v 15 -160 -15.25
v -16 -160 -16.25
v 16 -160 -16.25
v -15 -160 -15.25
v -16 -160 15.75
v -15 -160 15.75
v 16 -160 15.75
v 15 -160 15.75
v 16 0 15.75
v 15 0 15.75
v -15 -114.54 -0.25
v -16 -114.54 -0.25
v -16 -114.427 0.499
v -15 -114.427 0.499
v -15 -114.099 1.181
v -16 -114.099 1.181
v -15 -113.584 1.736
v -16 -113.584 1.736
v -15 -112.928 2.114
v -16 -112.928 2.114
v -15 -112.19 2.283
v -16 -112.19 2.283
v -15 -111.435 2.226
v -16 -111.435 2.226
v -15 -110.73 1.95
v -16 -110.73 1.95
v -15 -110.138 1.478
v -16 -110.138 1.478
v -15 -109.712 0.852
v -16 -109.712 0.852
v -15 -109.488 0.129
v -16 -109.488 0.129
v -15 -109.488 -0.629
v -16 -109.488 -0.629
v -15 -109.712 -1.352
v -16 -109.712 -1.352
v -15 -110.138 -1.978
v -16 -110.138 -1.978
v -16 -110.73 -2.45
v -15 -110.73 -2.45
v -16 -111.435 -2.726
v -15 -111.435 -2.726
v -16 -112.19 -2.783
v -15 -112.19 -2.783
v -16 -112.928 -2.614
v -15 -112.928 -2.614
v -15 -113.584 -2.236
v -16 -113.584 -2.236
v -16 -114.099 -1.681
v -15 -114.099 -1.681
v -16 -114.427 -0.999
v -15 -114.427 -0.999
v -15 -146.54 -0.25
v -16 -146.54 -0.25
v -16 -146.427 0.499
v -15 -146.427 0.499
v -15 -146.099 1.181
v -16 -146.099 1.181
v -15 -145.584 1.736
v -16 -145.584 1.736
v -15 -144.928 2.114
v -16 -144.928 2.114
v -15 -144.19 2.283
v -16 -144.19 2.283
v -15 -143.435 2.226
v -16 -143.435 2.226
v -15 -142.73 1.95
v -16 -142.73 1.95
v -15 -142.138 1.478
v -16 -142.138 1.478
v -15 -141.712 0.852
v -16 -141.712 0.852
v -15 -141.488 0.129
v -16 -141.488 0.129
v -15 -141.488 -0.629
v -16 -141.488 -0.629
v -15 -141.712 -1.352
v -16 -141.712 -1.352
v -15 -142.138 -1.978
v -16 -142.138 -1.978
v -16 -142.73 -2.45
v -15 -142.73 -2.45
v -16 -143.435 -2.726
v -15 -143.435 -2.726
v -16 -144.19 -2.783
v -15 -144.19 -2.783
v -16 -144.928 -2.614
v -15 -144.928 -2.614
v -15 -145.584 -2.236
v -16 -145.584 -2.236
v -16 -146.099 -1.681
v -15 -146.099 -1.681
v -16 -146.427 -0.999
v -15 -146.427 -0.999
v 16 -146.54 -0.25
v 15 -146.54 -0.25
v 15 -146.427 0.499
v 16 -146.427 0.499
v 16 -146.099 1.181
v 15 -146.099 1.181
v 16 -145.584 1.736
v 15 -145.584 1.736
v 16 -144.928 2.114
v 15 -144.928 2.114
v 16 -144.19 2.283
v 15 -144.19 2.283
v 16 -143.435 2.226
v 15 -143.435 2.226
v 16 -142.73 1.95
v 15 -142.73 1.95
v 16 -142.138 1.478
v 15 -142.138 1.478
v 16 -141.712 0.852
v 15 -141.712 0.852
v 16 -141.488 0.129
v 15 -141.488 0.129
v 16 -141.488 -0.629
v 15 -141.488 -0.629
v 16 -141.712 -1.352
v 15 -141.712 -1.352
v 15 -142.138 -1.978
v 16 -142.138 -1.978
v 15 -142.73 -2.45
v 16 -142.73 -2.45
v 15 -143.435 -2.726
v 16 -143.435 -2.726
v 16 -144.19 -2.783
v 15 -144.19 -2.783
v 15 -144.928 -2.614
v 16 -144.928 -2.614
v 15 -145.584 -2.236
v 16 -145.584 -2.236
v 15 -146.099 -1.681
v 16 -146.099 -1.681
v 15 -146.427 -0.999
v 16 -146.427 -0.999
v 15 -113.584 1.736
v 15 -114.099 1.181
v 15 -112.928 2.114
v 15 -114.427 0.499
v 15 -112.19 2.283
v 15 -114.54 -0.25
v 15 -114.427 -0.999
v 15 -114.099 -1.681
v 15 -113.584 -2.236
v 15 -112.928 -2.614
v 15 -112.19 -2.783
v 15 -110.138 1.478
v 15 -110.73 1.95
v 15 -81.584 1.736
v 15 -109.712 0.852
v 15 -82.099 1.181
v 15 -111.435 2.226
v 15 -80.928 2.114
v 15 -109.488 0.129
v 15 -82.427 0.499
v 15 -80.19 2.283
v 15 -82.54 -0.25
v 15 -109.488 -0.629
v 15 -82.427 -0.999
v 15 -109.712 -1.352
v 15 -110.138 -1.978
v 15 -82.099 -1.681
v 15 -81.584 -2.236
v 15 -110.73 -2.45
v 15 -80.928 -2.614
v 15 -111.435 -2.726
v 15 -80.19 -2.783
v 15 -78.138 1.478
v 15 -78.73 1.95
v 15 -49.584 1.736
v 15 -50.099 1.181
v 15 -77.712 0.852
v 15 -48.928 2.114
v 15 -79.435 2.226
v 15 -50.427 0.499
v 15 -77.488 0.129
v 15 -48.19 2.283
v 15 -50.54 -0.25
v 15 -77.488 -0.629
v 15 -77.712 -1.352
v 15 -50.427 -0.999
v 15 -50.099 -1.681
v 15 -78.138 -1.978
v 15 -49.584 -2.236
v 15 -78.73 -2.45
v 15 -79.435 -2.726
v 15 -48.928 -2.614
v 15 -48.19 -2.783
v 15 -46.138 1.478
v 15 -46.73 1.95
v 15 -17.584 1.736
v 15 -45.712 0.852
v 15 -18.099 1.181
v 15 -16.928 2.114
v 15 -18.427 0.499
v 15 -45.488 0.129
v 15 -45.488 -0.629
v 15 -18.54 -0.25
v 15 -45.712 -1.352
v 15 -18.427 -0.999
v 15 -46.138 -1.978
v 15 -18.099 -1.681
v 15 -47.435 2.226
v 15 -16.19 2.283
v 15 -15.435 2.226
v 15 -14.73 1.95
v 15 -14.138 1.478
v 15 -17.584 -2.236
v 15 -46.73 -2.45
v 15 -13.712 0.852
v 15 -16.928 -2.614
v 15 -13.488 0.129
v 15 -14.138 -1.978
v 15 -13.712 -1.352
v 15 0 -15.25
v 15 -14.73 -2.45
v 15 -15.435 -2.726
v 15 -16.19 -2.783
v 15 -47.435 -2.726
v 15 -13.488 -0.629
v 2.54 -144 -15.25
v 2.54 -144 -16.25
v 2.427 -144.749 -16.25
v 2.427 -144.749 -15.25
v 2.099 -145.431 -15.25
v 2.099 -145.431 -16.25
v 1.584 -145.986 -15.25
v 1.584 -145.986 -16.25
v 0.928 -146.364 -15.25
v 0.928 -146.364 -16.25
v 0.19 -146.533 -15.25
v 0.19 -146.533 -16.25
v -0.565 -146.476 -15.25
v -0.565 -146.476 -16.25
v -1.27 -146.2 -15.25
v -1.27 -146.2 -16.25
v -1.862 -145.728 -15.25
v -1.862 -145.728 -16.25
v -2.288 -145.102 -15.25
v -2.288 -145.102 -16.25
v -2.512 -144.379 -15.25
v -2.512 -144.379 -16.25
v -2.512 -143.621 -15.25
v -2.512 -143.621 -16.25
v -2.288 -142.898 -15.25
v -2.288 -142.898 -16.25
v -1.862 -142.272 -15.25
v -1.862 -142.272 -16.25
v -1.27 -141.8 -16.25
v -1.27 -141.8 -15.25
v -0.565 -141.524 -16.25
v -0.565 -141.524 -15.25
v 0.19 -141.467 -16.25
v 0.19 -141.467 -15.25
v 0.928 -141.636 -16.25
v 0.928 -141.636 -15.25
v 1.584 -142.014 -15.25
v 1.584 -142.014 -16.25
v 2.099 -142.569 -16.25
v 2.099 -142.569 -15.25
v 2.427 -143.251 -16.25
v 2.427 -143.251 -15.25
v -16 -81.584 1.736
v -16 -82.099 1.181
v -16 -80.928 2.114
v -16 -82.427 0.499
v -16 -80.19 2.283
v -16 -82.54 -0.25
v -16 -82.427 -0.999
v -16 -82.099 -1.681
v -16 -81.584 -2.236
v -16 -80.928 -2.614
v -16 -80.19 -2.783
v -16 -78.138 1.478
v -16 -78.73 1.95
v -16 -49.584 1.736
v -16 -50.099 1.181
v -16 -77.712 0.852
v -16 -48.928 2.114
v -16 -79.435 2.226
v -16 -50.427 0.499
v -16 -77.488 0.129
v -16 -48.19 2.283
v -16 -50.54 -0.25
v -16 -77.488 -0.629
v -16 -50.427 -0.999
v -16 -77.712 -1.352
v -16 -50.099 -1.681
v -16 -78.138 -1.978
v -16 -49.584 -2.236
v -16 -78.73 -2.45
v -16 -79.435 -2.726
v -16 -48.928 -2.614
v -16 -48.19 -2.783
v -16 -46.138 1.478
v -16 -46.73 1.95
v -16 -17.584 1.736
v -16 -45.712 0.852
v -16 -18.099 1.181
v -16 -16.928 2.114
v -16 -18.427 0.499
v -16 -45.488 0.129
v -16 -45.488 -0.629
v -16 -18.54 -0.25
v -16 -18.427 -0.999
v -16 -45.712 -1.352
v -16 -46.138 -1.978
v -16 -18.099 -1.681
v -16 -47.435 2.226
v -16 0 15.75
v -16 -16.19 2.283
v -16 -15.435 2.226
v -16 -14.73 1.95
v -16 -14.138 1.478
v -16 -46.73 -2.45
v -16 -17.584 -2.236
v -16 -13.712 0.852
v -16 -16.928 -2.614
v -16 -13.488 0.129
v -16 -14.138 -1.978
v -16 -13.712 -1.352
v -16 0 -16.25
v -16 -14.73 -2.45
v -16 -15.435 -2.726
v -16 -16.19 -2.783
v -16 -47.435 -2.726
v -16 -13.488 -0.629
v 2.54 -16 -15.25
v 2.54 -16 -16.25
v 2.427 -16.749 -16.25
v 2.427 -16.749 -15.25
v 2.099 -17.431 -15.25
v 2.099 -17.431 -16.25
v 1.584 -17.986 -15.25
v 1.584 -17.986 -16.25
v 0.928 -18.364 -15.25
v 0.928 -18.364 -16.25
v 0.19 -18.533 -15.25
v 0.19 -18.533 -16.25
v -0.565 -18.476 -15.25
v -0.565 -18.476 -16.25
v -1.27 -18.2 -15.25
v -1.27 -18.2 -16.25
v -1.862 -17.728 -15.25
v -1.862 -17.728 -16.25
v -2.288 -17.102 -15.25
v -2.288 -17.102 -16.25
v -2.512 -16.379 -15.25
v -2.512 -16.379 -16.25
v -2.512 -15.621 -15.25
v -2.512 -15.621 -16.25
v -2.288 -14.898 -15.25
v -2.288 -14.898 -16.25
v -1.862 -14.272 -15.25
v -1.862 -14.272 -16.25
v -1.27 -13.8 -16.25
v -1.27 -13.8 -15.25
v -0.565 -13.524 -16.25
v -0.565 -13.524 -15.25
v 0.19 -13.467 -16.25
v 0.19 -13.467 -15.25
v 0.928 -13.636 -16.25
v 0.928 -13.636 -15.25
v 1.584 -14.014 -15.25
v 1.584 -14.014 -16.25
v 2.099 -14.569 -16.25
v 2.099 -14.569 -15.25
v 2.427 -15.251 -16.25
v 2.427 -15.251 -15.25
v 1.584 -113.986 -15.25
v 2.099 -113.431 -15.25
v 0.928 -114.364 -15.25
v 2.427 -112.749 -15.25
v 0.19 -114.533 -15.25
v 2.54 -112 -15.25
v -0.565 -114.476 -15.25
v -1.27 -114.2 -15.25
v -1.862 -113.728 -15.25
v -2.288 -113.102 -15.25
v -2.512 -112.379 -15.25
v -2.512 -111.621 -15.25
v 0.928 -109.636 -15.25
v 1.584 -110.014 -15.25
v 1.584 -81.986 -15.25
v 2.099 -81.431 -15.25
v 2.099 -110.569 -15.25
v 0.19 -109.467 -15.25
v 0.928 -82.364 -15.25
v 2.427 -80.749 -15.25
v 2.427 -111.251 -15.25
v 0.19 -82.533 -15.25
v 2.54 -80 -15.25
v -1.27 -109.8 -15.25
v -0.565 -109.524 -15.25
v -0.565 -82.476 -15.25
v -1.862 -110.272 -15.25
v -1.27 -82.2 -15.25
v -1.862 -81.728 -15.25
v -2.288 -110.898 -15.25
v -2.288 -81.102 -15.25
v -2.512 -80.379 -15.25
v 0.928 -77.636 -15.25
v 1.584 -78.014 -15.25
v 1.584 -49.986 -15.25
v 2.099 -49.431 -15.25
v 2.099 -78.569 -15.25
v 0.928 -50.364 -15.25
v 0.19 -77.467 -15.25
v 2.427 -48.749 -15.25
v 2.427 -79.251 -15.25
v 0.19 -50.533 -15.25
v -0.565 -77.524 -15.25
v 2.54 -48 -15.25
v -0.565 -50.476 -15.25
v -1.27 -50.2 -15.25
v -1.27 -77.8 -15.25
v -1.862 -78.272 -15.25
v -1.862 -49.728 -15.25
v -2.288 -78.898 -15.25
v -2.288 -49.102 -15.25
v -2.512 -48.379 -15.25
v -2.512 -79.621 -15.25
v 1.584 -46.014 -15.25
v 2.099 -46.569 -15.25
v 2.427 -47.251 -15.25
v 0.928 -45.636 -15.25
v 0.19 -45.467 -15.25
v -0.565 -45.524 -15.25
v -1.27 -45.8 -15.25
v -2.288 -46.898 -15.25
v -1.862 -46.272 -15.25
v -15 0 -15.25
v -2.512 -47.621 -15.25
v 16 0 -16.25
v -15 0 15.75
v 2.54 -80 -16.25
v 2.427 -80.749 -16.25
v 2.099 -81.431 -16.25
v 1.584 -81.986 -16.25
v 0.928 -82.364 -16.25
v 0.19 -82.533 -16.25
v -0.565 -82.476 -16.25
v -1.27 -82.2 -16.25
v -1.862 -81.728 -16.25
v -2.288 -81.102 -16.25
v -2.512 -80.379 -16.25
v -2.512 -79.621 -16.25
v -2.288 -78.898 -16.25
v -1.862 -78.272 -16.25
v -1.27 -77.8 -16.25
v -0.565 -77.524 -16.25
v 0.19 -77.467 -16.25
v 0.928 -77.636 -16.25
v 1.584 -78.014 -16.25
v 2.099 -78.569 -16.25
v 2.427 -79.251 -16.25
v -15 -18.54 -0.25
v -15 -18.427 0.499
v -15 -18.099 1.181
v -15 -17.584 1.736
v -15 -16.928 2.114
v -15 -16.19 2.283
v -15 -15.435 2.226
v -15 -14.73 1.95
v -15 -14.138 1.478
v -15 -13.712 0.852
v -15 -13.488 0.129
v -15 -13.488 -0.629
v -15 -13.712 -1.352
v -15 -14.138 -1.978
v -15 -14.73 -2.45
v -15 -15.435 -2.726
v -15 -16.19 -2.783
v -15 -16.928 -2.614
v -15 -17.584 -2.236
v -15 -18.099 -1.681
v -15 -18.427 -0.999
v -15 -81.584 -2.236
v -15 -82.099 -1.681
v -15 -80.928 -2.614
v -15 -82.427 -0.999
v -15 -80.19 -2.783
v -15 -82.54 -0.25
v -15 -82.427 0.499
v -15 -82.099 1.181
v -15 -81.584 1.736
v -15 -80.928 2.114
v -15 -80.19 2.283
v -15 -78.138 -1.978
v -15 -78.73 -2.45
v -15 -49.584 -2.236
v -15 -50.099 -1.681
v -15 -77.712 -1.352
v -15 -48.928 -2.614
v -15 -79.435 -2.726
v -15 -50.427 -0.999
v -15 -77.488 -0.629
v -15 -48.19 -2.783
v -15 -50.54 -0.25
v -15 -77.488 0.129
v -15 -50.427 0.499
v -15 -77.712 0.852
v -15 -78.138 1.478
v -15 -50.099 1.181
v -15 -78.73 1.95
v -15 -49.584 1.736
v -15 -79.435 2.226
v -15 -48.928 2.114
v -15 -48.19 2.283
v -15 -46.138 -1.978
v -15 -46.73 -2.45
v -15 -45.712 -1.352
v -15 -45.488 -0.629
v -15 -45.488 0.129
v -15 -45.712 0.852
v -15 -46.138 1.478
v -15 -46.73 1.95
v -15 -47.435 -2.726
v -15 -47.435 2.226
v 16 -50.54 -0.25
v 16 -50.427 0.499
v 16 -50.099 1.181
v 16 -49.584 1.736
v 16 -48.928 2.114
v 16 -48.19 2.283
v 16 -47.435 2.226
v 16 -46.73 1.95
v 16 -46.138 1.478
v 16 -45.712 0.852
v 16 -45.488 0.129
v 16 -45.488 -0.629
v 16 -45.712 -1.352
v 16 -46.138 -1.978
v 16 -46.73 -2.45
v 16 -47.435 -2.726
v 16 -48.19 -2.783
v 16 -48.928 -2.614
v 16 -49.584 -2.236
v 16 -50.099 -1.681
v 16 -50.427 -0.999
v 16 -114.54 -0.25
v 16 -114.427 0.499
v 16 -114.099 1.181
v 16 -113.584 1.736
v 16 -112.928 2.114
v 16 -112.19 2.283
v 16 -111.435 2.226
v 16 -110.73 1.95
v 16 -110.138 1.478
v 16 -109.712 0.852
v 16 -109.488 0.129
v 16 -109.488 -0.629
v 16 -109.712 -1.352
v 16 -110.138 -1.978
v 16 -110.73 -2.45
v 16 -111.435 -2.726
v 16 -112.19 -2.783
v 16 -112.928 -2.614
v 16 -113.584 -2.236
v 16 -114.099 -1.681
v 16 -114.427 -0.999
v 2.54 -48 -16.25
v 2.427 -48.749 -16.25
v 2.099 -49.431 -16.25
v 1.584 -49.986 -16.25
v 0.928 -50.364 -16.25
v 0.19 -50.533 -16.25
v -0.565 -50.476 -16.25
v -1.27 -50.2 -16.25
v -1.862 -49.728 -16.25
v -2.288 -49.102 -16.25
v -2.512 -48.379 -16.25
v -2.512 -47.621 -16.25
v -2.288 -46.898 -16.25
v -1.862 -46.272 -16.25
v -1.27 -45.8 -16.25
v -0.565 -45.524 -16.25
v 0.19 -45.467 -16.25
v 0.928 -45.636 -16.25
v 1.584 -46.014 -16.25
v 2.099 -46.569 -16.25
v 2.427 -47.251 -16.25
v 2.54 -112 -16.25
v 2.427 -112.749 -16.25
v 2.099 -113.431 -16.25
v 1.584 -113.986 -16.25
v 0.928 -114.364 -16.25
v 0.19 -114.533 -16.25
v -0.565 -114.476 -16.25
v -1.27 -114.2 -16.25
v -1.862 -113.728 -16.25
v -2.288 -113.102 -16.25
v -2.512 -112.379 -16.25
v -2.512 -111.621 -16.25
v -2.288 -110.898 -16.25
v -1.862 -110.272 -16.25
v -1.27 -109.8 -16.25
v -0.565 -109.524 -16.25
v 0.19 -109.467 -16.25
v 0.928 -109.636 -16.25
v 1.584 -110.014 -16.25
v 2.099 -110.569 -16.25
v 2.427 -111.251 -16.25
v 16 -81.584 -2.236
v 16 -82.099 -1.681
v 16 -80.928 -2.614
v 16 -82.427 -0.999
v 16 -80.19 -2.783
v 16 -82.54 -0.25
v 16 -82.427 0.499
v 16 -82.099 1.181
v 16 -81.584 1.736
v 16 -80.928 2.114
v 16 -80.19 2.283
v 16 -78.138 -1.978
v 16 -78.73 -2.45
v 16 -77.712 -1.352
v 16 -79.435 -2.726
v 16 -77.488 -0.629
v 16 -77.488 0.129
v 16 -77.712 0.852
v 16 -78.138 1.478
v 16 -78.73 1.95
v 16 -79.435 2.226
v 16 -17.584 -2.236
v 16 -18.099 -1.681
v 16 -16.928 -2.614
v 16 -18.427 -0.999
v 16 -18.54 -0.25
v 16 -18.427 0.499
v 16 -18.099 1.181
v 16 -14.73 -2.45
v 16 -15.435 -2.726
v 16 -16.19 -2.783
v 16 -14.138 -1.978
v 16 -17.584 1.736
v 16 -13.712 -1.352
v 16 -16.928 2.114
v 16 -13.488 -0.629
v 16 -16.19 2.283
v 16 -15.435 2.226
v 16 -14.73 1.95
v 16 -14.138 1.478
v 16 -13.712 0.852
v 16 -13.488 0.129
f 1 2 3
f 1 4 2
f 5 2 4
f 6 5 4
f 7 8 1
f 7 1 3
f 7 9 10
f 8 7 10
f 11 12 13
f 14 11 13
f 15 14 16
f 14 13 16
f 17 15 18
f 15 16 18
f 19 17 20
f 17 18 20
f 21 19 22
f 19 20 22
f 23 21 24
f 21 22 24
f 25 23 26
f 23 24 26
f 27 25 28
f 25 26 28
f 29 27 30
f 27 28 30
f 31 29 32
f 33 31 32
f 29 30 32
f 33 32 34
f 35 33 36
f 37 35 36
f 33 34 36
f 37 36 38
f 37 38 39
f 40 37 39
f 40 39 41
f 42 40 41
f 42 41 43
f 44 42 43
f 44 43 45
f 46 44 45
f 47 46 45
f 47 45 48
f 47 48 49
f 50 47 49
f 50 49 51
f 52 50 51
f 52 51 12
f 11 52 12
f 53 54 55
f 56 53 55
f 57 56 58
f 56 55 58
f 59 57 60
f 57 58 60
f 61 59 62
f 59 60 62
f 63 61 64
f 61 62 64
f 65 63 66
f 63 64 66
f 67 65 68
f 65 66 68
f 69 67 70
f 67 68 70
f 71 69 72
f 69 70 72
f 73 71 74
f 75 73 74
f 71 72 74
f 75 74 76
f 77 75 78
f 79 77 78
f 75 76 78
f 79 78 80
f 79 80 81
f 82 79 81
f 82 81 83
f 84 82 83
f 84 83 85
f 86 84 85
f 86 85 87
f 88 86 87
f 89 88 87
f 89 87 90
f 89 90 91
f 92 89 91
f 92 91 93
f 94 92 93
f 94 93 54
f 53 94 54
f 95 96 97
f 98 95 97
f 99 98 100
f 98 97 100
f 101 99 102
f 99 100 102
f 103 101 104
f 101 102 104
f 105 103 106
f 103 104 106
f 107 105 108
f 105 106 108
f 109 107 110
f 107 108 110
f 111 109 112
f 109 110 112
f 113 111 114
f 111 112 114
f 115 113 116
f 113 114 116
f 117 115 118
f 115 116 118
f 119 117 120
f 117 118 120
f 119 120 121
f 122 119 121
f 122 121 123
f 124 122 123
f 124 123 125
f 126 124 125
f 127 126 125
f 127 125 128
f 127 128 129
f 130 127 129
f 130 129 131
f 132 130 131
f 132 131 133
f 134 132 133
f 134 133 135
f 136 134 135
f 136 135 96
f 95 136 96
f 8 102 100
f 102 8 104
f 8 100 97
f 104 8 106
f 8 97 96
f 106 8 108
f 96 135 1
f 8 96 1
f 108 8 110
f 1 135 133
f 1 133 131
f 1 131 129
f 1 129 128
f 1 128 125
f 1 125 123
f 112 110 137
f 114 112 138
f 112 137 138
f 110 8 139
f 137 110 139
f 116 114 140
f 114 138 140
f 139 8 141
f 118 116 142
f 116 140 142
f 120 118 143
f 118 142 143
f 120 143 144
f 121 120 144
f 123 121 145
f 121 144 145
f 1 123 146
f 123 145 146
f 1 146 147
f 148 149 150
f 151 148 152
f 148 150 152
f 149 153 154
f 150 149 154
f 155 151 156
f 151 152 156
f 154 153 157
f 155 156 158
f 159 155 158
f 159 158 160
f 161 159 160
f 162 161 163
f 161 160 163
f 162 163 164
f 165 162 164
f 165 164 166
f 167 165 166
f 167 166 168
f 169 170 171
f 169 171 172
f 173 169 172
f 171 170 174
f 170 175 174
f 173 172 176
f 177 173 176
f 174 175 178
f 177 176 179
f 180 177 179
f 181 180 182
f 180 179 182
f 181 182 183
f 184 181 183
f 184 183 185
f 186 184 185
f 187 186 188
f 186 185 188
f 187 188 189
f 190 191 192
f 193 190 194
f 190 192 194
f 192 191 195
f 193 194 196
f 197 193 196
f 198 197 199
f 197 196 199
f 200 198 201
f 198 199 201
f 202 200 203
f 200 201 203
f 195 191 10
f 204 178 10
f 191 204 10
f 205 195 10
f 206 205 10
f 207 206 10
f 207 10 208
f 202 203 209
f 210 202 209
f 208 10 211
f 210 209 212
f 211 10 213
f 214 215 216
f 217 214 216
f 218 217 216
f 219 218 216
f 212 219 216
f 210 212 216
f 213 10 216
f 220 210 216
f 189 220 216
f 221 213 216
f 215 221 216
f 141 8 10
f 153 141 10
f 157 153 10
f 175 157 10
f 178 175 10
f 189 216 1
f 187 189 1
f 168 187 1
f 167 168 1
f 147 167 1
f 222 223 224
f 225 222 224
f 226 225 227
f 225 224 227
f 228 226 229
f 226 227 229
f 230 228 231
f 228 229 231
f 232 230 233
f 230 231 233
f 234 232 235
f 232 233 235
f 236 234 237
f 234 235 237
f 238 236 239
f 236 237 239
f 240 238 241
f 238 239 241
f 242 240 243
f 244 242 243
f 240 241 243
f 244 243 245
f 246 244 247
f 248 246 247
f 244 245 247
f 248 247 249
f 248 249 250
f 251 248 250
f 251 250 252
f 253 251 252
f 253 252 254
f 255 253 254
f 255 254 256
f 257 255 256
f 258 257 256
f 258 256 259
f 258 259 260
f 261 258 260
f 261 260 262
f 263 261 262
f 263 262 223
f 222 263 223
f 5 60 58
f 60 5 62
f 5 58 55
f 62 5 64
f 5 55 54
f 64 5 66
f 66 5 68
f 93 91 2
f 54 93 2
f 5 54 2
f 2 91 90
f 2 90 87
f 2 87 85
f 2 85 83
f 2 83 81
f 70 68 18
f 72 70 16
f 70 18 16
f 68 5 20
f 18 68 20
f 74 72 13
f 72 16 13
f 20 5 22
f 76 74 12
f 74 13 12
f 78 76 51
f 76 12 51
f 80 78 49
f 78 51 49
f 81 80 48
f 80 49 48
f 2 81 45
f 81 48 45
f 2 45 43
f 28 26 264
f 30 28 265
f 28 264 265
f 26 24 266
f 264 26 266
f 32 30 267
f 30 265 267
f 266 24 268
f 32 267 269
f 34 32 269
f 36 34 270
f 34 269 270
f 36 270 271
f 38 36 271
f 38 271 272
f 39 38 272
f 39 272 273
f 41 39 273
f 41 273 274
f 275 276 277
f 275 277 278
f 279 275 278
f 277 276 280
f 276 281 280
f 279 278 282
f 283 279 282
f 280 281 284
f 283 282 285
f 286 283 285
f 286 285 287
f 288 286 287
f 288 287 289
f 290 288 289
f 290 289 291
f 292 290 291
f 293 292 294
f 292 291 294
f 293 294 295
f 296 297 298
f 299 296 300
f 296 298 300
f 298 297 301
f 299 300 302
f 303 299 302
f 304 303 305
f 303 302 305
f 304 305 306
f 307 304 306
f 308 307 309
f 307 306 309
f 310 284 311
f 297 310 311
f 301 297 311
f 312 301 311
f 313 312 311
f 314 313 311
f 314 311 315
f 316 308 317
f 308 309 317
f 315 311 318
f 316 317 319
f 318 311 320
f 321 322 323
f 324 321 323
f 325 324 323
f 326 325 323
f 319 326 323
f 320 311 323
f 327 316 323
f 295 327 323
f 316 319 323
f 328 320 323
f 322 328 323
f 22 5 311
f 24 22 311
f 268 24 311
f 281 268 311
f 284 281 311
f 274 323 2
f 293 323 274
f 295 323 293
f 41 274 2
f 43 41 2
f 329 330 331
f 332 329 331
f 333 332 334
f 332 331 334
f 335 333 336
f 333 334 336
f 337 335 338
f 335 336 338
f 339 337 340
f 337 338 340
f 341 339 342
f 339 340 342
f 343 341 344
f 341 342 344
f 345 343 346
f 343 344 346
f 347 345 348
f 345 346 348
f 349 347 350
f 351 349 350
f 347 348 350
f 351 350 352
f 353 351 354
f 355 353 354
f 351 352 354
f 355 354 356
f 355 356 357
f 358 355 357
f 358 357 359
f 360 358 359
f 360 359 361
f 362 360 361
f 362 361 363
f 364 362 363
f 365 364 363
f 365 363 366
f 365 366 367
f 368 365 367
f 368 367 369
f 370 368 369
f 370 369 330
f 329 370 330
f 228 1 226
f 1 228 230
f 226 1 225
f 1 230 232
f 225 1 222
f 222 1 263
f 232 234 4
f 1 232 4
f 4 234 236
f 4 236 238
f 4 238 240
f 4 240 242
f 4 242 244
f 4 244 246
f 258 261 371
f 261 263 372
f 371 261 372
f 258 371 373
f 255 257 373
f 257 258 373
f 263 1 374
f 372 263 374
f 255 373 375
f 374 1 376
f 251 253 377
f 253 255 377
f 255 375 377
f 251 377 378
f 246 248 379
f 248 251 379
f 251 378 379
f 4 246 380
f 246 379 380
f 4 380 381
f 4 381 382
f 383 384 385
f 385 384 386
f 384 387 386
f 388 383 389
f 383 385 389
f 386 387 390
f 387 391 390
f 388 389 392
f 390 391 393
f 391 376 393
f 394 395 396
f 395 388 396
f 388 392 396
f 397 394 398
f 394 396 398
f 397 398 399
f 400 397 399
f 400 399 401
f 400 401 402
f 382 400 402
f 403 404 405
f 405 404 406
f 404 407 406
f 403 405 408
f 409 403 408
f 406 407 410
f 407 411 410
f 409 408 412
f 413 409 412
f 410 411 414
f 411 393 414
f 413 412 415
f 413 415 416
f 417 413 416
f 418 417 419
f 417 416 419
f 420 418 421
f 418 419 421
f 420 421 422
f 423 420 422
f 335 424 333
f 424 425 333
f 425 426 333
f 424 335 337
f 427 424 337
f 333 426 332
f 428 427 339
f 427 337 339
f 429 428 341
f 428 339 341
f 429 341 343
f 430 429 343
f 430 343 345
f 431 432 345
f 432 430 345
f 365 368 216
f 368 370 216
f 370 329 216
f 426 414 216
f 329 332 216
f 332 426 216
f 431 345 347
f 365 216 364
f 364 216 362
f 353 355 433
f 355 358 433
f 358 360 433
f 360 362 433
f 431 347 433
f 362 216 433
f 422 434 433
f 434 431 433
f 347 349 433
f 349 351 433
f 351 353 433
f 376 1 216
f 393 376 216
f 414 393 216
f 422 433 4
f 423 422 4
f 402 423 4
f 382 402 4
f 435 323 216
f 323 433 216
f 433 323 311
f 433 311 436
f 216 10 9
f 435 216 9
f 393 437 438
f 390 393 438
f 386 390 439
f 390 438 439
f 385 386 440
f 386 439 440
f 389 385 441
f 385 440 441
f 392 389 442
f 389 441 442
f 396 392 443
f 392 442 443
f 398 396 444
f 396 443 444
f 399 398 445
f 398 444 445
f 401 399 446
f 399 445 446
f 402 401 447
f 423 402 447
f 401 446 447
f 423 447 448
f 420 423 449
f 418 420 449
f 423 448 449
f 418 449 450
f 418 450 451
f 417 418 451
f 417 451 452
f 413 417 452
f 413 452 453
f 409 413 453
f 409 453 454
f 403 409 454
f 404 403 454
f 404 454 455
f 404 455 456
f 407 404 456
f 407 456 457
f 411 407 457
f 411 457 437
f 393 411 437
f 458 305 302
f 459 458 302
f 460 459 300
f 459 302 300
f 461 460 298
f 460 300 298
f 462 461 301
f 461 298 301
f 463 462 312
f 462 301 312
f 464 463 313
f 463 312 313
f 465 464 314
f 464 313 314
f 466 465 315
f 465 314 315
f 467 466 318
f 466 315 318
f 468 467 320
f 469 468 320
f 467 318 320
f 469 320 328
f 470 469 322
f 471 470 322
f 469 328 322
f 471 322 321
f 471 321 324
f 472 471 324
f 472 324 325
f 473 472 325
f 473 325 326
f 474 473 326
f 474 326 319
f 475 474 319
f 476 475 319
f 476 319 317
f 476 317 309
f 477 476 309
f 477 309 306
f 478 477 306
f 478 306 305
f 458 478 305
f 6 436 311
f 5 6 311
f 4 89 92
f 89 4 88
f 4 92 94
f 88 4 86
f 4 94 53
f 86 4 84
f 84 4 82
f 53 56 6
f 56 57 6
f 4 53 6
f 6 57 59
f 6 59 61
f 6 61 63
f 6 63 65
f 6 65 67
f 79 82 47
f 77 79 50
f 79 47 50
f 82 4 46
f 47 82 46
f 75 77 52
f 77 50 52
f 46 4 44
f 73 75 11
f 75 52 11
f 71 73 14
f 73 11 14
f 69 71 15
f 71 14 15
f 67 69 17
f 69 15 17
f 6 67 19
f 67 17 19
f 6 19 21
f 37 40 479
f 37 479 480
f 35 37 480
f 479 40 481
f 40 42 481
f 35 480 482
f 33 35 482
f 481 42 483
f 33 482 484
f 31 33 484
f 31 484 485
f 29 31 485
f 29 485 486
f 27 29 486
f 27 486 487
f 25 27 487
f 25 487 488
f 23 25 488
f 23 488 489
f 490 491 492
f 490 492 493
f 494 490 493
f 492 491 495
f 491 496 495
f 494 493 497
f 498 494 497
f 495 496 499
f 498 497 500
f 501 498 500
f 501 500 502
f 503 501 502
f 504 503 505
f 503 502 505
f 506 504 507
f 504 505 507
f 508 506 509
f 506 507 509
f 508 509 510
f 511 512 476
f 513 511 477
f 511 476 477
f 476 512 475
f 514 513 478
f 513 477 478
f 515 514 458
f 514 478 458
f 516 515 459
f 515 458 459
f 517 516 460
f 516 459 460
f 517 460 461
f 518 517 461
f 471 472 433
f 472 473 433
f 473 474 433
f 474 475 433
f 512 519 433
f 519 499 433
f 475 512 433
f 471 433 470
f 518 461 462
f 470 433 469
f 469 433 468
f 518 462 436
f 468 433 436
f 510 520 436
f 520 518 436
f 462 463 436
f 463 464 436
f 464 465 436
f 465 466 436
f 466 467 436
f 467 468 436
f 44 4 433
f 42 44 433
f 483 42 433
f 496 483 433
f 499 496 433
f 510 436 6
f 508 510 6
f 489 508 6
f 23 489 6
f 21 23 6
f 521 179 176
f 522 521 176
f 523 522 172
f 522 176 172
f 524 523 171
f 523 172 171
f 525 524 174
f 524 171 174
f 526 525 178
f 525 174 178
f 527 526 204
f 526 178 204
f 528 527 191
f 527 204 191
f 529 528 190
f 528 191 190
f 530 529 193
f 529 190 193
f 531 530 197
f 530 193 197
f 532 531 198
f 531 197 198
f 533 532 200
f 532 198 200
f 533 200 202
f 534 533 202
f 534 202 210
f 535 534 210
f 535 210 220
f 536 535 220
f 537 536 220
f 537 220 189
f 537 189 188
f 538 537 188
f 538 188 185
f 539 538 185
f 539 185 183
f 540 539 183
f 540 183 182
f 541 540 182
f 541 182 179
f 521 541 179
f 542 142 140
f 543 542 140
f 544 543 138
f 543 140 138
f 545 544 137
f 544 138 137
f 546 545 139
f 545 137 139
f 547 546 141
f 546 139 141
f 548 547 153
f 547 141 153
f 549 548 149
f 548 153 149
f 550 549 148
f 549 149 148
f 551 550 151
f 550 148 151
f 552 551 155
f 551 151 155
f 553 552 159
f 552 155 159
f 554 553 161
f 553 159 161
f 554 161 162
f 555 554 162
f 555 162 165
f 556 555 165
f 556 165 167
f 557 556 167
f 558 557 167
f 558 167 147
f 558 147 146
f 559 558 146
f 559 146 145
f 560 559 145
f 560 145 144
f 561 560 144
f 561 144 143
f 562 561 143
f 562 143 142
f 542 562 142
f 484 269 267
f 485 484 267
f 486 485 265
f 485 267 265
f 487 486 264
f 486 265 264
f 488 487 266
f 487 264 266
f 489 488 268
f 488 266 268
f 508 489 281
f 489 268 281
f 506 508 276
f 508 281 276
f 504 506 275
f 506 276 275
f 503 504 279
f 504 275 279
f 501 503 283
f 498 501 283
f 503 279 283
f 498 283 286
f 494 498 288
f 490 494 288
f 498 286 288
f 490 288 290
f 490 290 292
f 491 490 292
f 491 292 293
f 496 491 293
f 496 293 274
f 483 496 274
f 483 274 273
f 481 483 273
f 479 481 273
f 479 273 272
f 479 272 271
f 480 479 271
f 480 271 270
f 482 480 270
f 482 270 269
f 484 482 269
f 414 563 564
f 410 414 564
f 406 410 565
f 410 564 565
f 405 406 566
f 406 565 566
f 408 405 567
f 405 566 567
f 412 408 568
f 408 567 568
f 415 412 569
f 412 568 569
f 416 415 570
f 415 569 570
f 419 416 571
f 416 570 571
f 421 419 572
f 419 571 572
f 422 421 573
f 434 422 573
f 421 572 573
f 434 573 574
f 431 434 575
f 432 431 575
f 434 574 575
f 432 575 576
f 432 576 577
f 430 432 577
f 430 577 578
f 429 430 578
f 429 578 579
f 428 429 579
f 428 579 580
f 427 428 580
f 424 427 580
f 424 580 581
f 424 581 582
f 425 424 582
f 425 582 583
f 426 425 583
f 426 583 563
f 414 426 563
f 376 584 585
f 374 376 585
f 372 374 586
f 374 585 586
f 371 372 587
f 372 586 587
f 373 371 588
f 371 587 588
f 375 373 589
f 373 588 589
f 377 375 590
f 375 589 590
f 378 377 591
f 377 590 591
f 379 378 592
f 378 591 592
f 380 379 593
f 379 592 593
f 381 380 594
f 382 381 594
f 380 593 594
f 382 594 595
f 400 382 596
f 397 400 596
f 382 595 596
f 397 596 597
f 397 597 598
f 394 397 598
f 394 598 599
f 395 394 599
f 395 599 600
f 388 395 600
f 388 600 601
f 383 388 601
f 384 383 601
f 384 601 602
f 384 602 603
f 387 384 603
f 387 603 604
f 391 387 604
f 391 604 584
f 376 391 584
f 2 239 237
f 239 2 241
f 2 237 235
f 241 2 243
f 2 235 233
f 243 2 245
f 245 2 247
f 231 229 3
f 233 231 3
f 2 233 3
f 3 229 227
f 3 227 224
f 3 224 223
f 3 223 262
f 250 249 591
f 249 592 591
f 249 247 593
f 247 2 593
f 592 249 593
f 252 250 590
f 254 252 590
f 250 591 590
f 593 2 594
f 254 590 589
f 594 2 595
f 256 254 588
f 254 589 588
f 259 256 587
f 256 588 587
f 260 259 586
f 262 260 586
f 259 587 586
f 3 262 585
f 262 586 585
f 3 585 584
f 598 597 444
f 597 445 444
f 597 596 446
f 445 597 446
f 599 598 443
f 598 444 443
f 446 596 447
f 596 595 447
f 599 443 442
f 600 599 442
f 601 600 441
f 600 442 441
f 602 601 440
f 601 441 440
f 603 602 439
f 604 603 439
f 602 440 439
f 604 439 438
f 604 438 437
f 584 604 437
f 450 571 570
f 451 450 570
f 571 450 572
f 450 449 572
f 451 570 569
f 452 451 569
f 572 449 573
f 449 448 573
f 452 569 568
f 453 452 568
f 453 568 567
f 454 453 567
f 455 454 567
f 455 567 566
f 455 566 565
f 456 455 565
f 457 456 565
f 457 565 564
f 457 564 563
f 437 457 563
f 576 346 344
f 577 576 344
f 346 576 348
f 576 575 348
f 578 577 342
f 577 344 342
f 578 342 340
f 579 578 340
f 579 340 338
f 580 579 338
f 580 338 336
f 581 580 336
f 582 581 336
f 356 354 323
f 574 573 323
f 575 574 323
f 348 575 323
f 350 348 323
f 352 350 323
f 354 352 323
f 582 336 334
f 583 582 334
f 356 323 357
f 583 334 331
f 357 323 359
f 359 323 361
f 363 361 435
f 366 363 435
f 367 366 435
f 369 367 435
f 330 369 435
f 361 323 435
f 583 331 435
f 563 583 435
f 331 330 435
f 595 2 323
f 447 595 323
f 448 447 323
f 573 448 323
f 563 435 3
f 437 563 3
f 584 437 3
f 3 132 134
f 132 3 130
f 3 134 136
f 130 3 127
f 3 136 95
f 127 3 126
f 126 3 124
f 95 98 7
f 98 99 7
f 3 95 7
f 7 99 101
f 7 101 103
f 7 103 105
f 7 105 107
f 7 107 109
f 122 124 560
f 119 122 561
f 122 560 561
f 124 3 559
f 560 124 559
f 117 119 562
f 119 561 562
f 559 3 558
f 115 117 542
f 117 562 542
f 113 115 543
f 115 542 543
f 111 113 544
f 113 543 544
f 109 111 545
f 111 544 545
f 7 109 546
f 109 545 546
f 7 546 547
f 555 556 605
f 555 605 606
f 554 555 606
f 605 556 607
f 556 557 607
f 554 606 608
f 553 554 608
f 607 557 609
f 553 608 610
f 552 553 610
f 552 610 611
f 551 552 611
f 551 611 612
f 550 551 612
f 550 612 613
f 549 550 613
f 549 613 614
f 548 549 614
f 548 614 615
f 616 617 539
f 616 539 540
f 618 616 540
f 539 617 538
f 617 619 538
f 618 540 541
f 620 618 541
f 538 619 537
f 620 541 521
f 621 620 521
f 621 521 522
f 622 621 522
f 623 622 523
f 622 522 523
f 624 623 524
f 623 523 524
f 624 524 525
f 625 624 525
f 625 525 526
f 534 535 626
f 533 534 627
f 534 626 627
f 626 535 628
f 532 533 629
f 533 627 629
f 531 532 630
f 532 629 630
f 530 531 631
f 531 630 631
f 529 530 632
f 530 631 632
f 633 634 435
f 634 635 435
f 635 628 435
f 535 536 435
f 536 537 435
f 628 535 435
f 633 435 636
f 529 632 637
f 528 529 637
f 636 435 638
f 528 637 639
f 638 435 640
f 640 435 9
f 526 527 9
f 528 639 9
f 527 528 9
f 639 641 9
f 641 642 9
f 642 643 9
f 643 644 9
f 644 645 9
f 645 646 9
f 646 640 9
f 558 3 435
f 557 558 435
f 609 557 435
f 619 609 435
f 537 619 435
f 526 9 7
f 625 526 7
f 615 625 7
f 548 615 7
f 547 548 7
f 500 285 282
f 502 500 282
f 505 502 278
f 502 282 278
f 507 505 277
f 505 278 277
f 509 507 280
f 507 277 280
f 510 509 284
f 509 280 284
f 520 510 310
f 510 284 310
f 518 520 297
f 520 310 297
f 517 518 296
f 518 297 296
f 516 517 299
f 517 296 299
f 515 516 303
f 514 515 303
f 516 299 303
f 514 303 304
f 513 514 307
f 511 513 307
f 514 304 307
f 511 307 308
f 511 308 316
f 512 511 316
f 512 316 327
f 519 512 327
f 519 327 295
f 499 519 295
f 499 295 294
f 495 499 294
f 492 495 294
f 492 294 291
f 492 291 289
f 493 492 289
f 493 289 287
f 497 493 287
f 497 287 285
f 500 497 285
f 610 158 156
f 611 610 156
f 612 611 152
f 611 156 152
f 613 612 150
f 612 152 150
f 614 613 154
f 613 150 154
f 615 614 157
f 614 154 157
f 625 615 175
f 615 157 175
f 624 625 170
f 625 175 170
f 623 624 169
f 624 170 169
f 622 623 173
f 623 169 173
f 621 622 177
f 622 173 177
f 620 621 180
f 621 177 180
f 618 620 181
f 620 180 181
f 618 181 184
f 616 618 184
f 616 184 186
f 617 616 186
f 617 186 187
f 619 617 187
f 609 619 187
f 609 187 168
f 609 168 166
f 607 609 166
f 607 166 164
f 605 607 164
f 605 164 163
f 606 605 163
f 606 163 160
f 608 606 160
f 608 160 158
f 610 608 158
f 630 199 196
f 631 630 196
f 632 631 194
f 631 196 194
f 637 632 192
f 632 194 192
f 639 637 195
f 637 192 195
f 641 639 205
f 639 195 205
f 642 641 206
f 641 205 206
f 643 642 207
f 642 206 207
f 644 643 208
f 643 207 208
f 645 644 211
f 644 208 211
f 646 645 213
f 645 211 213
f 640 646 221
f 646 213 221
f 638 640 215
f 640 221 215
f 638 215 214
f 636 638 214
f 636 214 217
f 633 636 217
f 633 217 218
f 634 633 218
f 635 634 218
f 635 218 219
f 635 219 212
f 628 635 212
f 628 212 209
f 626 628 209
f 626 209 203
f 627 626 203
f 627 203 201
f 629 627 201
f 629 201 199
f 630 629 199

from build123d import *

# Parameters (mm, degrees)
F1_DEPTH = 160
F2_R     = 2.54
F3_DEPTH = 50.8
F4_R     = 2.54
F5_DEPTH = 25.4


with BuildPart() as f1:
    # F0 (on Front) → F1 (new body)
    with BuildSketch(Plane.XZ):
        Polygon((-15, 15.75), (-16, 15.75), (-16, -16.25), (16, -16.25), (16, 15.75), (15, 15.75), (15, -15.25), (-15, -15.25), align=None)
    extrude(amount=F1_DEPTH)

    # F2 (on face) → F3 (cut)
    with BuildSketch(Plane(origin=(-16, 0, 0), x_dir=(0, -1, 0), z_dir=(-1, 0, 0))):
        with Locations((16, -0.25)):
            Circle(F2_R)
        with Locations((48, -0.25)):
            Circle(F2_R)
        with Locations((80, -0.25)):
            Circle(F2_R)
        with Locations((112, -0.25)):
            Circle(F2_R)
        with Locations((144, -0.25)):
            Circle(F2_R)
    extrude(amount=-F3_DEPTH, mode=Mode.SUBTRACT)

    # F4 (on face) → F5 (cut)
    with BuildSketch(Plane(origin=(0, 0, -16.25), x_dir=(1, 0, 0), z_dir=(0, 0, -1))):
        with Locations((0, 144)):
            Circle(F4_R)
        with Locations((0, 112)):
            Circle(F4_R)
        with Locations((0, 80)):
            Circle(F4_R)
        with Locations((0, 48)):
            Circle(F4_R)
        with Locations((0, 16)):
            Circle(F4_R)
    extrude(amount=-F5_DEPTH, mode=Mode.SUBTRACT)


solid = f1.part
